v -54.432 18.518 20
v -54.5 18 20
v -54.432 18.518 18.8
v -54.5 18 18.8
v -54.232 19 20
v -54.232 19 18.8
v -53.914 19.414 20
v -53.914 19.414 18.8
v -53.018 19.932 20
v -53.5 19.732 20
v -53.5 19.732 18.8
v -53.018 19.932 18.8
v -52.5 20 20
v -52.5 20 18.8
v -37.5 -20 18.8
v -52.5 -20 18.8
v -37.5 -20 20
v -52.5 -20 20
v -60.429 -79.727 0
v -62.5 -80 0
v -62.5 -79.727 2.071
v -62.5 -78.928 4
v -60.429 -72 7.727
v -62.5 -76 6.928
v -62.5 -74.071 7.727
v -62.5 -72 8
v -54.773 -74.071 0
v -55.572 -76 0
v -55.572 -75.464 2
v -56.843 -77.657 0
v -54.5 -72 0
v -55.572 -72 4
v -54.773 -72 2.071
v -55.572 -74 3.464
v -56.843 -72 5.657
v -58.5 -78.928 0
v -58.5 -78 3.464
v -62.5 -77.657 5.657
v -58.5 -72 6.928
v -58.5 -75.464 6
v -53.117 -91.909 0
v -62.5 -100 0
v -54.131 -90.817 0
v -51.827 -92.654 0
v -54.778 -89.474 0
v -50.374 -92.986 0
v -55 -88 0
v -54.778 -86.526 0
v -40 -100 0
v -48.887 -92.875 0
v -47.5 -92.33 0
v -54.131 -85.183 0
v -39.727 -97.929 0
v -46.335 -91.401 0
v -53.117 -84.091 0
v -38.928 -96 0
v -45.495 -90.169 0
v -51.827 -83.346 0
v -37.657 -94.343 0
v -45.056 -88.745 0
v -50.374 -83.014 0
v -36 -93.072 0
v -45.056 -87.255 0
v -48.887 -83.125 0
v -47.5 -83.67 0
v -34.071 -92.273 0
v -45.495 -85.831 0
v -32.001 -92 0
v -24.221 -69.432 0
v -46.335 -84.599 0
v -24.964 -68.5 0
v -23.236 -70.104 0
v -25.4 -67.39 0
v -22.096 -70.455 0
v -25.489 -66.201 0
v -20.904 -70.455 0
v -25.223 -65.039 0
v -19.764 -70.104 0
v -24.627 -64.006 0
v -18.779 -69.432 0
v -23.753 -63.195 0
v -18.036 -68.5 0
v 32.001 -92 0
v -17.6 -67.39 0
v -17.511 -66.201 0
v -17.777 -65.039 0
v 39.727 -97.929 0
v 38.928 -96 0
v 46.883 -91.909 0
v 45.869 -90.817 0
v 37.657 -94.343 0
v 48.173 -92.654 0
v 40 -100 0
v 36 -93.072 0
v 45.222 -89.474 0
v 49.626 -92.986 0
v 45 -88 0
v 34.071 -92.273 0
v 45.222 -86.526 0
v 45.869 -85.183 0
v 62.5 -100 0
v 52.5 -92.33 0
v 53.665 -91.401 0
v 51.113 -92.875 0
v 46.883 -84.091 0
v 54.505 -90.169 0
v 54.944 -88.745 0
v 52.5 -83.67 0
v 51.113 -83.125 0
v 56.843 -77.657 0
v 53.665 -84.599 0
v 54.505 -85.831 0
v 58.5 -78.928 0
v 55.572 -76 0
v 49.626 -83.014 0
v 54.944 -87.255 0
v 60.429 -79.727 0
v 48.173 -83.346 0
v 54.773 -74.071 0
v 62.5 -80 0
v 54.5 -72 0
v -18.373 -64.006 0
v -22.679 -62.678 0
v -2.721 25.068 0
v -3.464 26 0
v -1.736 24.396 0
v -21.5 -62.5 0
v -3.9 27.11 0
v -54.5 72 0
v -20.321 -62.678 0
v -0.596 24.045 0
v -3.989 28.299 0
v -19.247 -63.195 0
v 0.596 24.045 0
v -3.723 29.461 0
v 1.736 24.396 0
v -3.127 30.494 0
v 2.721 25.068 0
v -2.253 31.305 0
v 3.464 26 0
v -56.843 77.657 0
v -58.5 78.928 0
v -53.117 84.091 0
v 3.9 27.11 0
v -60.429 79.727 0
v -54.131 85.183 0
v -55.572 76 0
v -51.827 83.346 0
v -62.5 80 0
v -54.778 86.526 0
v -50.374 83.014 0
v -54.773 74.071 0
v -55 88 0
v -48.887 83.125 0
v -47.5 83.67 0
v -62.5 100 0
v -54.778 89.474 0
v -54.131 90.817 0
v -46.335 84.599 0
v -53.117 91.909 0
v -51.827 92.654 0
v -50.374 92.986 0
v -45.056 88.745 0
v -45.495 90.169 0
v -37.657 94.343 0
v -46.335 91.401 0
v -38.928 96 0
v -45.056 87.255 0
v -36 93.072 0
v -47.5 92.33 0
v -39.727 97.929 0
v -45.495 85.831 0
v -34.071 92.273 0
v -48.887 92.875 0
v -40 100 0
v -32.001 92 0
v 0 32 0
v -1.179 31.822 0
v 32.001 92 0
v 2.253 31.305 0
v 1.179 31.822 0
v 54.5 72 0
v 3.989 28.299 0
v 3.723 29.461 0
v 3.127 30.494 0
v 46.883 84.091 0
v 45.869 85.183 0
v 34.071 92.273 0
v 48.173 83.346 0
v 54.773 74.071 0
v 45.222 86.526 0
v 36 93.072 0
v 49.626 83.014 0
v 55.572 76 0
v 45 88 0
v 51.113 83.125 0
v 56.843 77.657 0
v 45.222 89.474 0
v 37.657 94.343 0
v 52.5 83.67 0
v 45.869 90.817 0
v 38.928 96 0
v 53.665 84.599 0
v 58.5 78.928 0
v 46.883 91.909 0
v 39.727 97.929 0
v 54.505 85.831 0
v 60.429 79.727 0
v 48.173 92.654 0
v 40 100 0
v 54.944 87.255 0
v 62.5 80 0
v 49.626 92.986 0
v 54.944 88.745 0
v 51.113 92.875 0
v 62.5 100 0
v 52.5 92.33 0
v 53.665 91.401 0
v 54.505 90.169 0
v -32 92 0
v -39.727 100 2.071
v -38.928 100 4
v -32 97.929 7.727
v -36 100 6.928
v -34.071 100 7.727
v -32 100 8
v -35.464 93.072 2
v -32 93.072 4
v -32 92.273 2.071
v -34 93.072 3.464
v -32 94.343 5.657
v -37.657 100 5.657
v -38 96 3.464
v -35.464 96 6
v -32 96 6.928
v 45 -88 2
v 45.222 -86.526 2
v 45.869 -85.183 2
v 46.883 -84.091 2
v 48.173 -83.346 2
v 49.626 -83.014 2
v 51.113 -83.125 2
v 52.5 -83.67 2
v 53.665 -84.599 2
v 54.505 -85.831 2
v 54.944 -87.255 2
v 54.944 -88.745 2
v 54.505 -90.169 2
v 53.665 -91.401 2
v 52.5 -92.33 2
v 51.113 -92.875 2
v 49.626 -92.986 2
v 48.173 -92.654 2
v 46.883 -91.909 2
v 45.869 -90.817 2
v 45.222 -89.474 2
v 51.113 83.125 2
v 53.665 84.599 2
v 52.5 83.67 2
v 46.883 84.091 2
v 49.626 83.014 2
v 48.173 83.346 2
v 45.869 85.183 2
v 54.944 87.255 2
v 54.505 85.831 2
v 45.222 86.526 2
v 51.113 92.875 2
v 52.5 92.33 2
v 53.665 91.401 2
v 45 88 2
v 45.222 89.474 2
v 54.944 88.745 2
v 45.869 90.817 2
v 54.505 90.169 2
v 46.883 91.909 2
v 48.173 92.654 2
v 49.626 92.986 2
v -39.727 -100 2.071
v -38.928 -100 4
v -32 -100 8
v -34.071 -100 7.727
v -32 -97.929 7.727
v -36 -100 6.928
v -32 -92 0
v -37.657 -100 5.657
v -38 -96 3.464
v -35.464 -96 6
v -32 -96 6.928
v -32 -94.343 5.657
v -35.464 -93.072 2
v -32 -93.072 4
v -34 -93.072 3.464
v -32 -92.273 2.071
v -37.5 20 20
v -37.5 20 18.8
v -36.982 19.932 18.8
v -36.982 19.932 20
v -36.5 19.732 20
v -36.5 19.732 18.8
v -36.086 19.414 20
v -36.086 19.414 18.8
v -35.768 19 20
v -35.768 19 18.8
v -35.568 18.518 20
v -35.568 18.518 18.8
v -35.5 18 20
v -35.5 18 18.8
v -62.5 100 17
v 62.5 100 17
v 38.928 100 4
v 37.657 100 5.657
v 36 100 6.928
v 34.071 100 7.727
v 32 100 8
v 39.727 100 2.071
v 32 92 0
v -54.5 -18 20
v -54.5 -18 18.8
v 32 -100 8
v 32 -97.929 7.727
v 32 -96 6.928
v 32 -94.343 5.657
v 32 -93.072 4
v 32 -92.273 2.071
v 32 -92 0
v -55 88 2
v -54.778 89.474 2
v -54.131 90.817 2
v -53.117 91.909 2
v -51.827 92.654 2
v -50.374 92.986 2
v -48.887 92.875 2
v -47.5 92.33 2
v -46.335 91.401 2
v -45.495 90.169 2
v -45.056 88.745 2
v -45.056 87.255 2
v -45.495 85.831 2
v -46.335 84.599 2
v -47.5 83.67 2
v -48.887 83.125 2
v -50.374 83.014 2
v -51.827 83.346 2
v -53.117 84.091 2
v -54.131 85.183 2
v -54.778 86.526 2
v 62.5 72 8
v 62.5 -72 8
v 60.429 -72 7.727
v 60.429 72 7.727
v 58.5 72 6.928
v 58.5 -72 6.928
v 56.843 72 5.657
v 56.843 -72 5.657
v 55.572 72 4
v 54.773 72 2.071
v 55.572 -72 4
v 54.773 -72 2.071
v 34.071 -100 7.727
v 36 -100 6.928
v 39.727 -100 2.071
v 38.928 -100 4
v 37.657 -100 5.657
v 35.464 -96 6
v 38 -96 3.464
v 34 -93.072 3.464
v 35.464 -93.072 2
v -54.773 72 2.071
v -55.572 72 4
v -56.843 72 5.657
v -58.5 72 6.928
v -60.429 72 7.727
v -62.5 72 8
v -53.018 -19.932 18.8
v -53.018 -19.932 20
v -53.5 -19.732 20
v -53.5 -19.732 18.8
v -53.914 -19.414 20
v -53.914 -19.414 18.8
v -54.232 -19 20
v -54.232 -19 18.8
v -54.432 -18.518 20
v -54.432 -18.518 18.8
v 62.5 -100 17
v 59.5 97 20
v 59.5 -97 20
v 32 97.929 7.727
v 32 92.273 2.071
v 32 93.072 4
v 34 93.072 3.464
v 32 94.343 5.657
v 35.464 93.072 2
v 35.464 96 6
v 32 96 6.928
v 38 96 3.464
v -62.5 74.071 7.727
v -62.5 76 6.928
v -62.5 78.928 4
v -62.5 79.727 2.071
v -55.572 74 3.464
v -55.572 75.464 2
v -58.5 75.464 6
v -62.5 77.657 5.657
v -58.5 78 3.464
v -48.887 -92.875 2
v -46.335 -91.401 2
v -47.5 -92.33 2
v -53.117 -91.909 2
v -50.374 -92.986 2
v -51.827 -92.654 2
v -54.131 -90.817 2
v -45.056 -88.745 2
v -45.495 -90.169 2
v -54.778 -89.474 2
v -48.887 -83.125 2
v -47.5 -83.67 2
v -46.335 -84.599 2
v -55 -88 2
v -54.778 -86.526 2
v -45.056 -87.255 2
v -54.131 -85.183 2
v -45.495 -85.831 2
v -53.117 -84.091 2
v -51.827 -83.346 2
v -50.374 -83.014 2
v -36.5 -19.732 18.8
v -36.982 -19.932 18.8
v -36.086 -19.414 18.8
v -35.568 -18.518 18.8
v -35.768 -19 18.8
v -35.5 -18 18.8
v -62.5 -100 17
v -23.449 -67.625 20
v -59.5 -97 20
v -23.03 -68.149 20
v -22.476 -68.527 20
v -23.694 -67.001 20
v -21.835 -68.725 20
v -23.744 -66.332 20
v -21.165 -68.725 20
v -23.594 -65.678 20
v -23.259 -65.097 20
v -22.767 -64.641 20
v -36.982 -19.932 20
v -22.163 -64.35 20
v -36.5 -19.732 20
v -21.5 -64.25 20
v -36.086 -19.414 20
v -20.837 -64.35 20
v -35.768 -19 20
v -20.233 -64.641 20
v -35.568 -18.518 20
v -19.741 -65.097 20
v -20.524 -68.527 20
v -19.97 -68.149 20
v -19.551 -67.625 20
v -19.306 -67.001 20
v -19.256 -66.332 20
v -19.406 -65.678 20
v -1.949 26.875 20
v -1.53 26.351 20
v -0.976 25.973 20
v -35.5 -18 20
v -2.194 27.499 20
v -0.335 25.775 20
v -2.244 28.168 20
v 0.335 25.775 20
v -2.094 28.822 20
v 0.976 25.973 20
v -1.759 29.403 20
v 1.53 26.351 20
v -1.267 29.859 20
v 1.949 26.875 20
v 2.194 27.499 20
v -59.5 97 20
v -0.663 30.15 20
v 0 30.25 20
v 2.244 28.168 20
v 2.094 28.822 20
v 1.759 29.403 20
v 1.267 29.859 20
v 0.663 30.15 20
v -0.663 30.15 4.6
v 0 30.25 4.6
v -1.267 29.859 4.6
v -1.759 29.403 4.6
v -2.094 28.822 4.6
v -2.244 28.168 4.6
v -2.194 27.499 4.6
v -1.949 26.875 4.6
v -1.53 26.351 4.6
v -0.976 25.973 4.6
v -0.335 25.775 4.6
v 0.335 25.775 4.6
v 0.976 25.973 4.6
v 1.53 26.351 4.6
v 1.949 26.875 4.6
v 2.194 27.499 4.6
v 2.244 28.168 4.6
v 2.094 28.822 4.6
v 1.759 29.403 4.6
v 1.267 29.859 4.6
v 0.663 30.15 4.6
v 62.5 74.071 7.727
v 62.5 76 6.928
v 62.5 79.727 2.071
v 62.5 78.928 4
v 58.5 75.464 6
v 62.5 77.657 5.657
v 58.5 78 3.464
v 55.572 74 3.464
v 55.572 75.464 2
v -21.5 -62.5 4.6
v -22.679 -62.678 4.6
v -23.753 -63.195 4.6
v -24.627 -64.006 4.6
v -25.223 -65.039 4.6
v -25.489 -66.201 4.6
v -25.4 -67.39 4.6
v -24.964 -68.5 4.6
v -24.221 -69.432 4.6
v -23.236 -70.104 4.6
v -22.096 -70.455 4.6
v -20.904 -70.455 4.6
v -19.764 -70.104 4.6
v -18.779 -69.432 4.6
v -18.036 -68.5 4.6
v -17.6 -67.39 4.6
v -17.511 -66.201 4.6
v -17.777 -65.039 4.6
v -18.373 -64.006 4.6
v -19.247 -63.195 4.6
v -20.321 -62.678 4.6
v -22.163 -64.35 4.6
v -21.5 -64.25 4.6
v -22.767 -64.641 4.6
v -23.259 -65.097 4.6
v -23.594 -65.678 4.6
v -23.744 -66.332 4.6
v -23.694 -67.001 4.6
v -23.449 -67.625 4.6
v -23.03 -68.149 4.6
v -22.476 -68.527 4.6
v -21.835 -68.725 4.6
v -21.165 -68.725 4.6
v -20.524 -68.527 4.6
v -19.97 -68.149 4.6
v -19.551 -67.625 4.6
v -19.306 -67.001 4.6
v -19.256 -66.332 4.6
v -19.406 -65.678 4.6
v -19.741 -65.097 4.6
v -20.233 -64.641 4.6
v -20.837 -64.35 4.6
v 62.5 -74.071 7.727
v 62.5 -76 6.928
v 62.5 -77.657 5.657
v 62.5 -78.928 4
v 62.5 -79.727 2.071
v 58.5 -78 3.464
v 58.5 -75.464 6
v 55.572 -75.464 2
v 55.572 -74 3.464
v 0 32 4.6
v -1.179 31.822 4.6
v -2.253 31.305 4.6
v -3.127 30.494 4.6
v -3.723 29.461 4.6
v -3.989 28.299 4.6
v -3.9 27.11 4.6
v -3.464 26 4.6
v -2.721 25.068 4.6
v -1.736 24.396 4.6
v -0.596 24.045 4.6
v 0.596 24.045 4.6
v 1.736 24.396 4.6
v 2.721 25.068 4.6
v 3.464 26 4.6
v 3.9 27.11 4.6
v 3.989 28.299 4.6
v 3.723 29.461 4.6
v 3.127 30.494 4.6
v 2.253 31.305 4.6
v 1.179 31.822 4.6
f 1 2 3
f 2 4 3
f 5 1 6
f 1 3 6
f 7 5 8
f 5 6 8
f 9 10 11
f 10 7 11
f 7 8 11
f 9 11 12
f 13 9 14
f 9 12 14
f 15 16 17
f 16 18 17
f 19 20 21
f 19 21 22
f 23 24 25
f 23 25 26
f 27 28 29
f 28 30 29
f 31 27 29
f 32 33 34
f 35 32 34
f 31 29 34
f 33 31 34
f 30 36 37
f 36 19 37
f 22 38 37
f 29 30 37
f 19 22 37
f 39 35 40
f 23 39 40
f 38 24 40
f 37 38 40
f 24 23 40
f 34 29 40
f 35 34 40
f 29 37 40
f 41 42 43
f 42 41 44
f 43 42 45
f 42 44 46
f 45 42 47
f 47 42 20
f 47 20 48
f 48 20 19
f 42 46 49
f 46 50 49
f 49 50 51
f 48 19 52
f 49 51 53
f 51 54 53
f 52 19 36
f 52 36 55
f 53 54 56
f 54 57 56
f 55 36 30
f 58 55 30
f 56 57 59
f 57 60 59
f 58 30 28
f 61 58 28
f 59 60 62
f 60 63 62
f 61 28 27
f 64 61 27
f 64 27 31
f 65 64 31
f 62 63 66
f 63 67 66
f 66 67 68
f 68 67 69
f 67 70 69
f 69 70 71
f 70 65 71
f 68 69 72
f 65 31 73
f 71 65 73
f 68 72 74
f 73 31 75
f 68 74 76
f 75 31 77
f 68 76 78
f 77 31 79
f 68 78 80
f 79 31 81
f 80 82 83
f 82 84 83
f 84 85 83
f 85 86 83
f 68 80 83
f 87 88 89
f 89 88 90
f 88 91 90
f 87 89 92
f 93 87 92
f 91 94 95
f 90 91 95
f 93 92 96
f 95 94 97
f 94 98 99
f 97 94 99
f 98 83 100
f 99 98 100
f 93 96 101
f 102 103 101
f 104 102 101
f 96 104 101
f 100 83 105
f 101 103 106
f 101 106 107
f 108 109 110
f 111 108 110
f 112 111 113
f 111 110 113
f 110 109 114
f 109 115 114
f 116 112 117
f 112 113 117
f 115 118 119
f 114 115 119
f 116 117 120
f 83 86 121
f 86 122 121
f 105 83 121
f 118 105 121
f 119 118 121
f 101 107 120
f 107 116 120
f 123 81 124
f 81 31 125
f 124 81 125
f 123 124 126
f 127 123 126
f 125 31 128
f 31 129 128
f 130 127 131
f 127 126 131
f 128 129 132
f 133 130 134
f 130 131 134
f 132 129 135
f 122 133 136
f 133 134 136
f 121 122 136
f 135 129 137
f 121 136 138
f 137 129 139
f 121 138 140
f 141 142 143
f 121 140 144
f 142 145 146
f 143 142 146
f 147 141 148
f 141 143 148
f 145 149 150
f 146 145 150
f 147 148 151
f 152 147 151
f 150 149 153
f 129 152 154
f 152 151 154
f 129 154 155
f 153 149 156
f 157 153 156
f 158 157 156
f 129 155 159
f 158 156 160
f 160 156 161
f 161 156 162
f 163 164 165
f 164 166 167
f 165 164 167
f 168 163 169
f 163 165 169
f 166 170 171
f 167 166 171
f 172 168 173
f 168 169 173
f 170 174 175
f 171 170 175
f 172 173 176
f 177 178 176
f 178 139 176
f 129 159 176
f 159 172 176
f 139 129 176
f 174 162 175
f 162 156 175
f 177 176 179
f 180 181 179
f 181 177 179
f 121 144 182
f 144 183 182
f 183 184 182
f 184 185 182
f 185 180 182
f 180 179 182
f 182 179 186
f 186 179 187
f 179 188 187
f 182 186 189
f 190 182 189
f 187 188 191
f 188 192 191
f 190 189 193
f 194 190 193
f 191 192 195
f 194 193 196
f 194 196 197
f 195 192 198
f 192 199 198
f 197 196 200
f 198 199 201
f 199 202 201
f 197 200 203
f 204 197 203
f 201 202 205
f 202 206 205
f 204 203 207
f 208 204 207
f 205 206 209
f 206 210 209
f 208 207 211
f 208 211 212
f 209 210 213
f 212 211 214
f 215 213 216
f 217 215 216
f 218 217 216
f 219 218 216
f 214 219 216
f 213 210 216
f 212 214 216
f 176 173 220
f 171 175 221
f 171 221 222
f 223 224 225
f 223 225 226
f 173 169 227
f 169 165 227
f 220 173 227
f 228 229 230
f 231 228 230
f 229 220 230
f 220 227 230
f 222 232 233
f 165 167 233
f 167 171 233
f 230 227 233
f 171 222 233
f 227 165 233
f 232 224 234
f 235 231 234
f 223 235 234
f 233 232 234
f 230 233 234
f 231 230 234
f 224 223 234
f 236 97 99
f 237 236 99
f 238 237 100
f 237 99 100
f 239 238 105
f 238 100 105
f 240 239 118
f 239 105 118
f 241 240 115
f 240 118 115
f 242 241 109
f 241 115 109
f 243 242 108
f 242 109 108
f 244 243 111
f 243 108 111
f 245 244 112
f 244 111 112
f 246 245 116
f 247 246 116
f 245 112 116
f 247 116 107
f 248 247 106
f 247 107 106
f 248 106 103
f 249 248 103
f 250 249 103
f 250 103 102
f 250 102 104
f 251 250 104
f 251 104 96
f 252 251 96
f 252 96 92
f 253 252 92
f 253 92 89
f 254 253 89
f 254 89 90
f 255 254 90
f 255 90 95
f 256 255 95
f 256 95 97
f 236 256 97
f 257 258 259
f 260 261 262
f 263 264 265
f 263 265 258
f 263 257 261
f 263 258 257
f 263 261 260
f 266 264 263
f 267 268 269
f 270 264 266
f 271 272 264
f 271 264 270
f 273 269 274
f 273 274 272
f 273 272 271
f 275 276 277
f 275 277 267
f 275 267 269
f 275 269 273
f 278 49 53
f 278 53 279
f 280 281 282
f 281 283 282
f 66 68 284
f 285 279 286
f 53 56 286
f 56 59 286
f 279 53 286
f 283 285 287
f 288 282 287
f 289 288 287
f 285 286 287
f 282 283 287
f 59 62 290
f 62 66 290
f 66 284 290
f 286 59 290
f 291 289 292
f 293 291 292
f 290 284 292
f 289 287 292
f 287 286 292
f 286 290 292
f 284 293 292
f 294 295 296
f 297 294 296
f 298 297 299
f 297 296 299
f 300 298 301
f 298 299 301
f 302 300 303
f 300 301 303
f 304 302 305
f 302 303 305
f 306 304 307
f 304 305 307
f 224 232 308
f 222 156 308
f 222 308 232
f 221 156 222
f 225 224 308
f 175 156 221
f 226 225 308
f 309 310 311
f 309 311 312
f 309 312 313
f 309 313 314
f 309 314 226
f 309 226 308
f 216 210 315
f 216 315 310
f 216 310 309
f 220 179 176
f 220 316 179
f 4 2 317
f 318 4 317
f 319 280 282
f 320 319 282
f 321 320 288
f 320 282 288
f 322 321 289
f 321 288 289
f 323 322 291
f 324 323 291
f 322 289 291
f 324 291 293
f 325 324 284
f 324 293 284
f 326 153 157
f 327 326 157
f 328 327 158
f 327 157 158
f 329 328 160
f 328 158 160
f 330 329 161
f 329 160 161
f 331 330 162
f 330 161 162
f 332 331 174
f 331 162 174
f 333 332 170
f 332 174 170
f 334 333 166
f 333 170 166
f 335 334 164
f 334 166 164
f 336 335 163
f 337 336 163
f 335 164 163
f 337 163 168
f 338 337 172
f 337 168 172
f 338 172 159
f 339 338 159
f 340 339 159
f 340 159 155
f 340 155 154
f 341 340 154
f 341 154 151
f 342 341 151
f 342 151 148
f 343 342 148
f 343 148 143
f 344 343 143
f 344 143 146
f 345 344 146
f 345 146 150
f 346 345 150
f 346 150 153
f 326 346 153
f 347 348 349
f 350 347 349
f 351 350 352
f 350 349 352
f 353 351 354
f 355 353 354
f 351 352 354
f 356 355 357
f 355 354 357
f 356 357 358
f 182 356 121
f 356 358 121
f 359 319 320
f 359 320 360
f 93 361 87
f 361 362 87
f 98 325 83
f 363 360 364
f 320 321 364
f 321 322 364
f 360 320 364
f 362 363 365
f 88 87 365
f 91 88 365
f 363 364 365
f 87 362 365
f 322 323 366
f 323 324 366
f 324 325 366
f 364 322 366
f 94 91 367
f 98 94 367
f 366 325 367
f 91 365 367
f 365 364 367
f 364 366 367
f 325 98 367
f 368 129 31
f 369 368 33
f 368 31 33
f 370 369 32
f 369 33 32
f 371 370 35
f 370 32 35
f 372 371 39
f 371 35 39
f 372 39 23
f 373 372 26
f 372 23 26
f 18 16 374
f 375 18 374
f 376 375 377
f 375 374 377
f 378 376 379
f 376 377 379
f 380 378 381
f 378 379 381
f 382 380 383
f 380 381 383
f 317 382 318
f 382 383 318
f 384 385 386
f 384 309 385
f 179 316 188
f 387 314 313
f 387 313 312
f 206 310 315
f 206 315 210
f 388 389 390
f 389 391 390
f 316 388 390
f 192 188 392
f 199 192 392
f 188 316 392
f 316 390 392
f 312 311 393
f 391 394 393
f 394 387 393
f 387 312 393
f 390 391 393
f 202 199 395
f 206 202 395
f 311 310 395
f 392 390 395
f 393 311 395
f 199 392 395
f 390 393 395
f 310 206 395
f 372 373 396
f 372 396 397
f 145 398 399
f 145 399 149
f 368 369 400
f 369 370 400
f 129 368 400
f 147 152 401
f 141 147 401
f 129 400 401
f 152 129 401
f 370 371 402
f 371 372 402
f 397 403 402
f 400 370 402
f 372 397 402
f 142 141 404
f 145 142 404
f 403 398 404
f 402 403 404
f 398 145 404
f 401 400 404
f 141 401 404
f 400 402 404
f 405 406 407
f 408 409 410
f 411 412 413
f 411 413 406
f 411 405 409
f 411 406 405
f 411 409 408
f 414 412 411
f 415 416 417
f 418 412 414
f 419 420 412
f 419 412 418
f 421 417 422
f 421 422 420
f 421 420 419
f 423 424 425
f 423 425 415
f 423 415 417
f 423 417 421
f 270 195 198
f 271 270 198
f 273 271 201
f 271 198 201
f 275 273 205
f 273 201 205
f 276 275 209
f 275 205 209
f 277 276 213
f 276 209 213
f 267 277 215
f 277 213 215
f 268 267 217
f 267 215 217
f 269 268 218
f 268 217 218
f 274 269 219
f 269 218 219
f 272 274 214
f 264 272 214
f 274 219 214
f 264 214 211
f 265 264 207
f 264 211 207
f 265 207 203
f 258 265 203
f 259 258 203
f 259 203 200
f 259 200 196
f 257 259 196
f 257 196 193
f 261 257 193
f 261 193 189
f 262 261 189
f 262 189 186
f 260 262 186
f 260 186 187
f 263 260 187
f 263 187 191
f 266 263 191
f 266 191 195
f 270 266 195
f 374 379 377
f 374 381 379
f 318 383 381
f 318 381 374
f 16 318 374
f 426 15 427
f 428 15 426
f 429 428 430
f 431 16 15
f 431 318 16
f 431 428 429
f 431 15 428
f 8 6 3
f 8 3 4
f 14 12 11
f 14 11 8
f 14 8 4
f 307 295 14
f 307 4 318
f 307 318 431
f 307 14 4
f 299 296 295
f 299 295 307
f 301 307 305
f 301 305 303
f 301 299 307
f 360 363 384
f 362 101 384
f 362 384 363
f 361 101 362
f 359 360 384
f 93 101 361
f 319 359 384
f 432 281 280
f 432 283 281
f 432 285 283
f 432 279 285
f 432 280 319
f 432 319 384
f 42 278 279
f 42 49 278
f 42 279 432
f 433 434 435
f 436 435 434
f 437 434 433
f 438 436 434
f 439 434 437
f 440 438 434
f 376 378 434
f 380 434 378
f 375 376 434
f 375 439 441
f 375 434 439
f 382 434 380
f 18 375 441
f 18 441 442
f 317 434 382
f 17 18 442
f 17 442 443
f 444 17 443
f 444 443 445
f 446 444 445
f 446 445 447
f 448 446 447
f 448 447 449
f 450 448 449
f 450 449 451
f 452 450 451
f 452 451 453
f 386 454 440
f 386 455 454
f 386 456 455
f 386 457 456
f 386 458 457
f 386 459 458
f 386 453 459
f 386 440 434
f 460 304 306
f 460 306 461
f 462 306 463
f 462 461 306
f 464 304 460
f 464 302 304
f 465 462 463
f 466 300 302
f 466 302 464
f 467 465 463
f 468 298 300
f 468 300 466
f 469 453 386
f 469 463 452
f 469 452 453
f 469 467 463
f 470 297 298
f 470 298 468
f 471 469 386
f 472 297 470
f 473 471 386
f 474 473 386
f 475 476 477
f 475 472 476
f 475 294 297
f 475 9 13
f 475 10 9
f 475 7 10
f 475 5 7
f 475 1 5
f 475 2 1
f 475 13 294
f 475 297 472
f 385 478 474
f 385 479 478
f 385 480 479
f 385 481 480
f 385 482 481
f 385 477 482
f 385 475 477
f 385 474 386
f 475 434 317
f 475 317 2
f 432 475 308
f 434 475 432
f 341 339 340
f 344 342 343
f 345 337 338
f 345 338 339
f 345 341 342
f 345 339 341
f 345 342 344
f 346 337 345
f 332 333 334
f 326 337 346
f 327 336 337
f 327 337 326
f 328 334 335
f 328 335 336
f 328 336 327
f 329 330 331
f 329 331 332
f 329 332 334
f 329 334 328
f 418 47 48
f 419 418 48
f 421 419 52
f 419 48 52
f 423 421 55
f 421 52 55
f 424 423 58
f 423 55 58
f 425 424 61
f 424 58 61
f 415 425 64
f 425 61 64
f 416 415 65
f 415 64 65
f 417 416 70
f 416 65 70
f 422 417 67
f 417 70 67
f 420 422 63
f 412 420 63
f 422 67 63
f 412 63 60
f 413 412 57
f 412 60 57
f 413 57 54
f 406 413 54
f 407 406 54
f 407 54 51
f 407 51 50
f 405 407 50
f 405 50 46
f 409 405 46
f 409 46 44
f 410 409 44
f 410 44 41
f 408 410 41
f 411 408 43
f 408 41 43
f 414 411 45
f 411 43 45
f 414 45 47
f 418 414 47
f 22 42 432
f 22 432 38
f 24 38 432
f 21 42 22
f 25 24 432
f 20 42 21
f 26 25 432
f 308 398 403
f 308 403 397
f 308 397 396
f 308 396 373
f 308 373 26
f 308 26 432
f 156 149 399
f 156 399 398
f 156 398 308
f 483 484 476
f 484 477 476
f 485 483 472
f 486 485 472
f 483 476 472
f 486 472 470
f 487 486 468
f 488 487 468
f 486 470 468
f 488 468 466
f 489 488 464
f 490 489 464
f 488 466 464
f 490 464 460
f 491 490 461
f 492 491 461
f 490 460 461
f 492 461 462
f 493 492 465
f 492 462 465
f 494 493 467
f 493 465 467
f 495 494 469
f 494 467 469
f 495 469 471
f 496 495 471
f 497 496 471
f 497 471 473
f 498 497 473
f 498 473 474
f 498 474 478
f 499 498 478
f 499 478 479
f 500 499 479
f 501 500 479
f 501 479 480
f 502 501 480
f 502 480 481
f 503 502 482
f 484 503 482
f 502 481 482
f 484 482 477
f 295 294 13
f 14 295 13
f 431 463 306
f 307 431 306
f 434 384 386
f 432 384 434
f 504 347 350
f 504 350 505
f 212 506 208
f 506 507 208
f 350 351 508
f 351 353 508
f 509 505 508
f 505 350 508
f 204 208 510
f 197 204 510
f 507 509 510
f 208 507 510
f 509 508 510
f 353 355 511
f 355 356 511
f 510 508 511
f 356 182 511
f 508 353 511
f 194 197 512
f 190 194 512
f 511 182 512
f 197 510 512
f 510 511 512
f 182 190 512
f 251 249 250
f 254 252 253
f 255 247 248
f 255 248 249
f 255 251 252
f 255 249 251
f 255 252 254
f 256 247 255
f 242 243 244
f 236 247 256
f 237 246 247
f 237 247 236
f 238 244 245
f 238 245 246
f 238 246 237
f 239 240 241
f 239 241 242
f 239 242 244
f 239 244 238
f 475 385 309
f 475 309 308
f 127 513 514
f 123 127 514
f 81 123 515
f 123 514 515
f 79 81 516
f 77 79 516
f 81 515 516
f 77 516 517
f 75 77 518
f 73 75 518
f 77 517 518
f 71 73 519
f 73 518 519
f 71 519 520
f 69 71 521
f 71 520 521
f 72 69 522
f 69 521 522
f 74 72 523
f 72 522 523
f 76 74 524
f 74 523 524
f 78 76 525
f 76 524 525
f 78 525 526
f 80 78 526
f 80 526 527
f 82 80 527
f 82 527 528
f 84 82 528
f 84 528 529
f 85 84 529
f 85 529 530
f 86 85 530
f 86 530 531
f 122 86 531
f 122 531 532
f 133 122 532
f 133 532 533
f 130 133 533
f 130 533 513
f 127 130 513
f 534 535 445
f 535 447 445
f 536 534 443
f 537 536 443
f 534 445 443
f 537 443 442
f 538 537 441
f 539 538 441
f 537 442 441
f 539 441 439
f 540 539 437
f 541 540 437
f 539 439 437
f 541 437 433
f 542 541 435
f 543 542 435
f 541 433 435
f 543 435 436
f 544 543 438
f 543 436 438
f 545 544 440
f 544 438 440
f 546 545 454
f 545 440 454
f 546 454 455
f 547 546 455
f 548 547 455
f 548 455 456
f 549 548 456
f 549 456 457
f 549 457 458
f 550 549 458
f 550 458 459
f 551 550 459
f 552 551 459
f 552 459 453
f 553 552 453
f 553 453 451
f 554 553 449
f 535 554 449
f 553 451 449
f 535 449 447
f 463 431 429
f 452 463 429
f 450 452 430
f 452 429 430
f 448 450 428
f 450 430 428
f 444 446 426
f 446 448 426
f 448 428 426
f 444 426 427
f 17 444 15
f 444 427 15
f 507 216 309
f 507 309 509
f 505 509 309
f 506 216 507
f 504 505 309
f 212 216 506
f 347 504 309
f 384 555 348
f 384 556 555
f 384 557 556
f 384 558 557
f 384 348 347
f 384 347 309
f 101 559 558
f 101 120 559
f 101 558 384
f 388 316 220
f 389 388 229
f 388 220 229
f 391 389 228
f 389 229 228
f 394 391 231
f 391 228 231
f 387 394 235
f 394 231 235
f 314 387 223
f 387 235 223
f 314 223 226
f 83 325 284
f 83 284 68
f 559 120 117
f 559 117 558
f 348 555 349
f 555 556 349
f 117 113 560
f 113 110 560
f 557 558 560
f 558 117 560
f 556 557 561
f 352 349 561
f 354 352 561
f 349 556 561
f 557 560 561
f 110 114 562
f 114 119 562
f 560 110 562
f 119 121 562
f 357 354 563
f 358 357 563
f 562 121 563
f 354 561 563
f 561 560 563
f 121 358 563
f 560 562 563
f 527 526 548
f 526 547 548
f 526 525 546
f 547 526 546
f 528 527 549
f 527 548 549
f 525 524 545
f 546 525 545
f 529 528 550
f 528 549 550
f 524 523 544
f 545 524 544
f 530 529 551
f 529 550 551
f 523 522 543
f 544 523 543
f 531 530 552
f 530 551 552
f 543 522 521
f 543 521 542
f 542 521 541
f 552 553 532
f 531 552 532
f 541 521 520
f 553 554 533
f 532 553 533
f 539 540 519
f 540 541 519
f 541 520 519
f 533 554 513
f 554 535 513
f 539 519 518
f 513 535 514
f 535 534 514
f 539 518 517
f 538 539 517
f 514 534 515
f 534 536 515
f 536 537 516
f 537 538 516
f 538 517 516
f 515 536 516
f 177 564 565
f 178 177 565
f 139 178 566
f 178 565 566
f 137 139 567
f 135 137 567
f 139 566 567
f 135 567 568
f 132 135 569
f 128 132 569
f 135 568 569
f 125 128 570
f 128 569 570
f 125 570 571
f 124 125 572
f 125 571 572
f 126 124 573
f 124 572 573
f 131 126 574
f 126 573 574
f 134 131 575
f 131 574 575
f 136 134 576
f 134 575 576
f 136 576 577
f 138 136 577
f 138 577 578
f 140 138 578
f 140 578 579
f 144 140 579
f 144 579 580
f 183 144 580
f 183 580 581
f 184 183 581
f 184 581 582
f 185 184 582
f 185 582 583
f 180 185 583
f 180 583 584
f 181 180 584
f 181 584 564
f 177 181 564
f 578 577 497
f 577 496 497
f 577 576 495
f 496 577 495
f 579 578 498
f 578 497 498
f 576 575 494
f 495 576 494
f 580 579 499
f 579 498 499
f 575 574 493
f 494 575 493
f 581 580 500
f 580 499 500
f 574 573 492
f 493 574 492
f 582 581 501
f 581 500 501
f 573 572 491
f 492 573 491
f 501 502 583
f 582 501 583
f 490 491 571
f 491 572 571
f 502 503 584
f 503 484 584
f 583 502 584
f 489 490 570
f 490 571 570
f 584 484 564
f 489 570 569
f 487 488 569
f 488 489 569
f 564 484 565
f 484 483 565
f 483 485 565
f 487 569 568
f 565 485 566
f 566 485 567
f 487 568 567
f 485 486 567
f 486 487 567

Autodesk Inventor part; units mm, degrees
ref_plane "YZ Plane" through (0, 0, 0) normal (1, 0, 0) x (0, 1, 0)
ref_plane "XZ Plane" through (0, 0, 0) normal (0, 1, 0) x (-1, 0, 0)
ref_plane "XY Plane" through (0, 0, 0) normal (0, 0, 1) x (1, 0, 0)
sketch "Skizze1" plane through (0, 0, 0) normal (0, 0, 1) x (1, 0, 0)
  line L0 (-87.5, 0) -> (87.5, 0) projected
  line L1 (0, -140) -> (0, 140) projected
  line L2 (-62.5, 100) -> (62.5, 100)
  line L3 (62.5, 100) -> (62.5, -100)
  line L4 (62.5, -100) -> (-62.5, -100)
  line L5 (-62.5, -100) -> (-62.5, 100)
  point P0 (0, 0)
  dimension "d0" = 125
  dimension "d1" = 200
extrude "Grundkörper" add sketch "Skizze1" along normal blind 20
chamfer "umlaufende Fase 3x45°" distance 3 angle 45 4 edges at (0, -100, 20) (62.5, 0, 20) (0, 100, 20) (-62.5, 0, 20)
sketch "Fräsung Rund" plane through (-62.5, -100, 0) normal (0, -1, 0) x (1, 0, 0)
  line L0 (62.5, -4) -> (62.5, 24) projected
  line L1 (-25, 0) -> (150, 0) projected
  line L2 (125, 0) -> (0, 0) projected
  line L3 (30.5, 8) -> (94.5, 8)
  arc A0 (102.5, 0) -> (94.5, 8) centre (94.5, 0) ccw
  arc A1 (30.5, 8) -> (22.5, 0) centre (30.5, 0) ccw
  point P0 (62.5, 0)
  dimension "d13" = 80
  dimension "d14" = 8
  dimension "d15" = 8
  dimension "d16" = 8
extrude "Querfräsung 80" cut sketch "Fräsung Rund" against normal blind 8
fillet "Rundung Querfräsung" radius 8 3 edges at (37.6569, -92, 5.6569) (-37.6569, -92, 5.6569) (0, -92, 8)
mirror "Spiegeln Querfräsung" about plane through (0, 0, 0) normal (0, 1, 0) of "Querfräsung 80", "Rundung Querfräsung"
sketch "Skizze5" plane through (62.5, -100, 0) normal (1, 0, 0) x (0, 0, -1)
  line L0 (0, -40) -> (0, 240) projected
  line L1 (4, 100) -> (-24, 100) projected
  line L2 (0, 200) -> (0, 0) projected
  arc A0 (-8, 28) -> (0, 20) centre (0, 28) ccw
  arc A1 (0, 180) -> (-8, 172) centre (0, 172) ccw
  line L3 (-8, 28) -> (-8, 172)
  point P0 (0, 100)
  dimension "d21" = 8
  dimension "d22" = 8
  dimension "d23" = 8
  dimension "d24" = 160
extrude "Längsfräsung 160" cut sketch "Skizze5" against normal blind 8
fillet "Rundung Längsfräsung" radius 8 3 edges at (54.5, 77.6569, 5.6569) (54.5, -77.6569, 5.6569) (54.5, 0, 8)
mirror "Spiegeln Längsfräsung" about plane through (0, 0, 0) normal (1, 0, 0) of "Längsfräsung 160", "Rundung Längsfräsung"
sketch "Skizze6" plane through (0, 0, 20) normal (0, 0, 1) x (1, 0, 0)
  line L0 (-87.5, 0) -> (87.5, 0) projected
  line L1 (0, -140) -> (0, 140) projected
  line L2 (-54.5, -20) -> (-35.5, -20)
  line L3 (-35.5, -20) -> (-35.5, 20)
  line L4 (-35.5, 20) -> (-54.5, 20)
  line L5 (-54.5, 20) -> (-54.5, -20)
  line L6 (-62.5, 100) -> (-62.5, -100) projected
  point P0 (0, 0)
  dimension "d28" = 19
  dimension "d29" = 40
  dimension "d34" = 8
extrude "Tasche 40x19x1,2" cut sketch "Skizze6" against normal blind 1.2
fillet "Rundung Tasche" radius 2 4 edges at (-54.5, 20, 19.4) (-54.5, -20, 19.4) (-35.5, 20, 19.4) (-35.5, -20, 19.4)
sketch "Skizze9" plane through (0, 0, 0) normal (0, 0, -1) x (-1, 0, 0)
  line L0 (-62.5, -100) -> (-40, -100) projected
  line L1 (0, -140) -> (0, 140) projected
  line L2 (87.5, 0) -> (-87.5, 0) projected
  line L3 (62.5, -100) -> (62.5, -80) projected
  line L4 (40, -100) -> (62.5, -100) projected
  point P0 (0, 0)
  point P1 (21.5, -66.5)
  point P2 (0, 28)
  dimension "d65" = 33.5
  dimension "d66" = 94.5
  dimension "d67" = 21.5
hole "Durchgangsbohrung Ø4,5" at (-21.5, -66.5, 0) at (0, 28, 0) direction (0, 0, 1) diameter 4.5 end through all counterbore diameter 8 counterbore depth 4.6 clearance for "Sechskantkopfschraube DIN EN 24017" size "M4" standard "DIN"
sketch "Skizze10" plane through (0, 0, 0) normal (0, 0, -1) x (-1, 0, 0)
  line L0 (-32, 100) -> (32, 100) projected
  line L1 (62.5, 72) -> (62.5, -72) projected
  line L2 (-87.5, 0) -> (87.5, 0) projected
  line L3 (0, -140) -> (0, 140) projected
  circle A0 centre (-50, 88) radius 5
  circle A1 centre (50, 88) radius 5
  circle A2 centre (-50, -88) radius 5
  circle A3 centre (50, -88) radius 5
  point P0 (0, 0)
  dimension "d68" = 50
  dimension "d69" = 100
  dimension "d70" = 176
  dimension "d71" = 176
  dimension "d72" = 50
  dimension "d73" = 100
  dimension "d74" = 10
  dimension "d75" = 10
  dimension "d76" = 10
  dimension "d77" = 10
extrude "Extrusion5" cut sketch "Skizze10" against normal blind 2
properties part number "Grundplatte"
